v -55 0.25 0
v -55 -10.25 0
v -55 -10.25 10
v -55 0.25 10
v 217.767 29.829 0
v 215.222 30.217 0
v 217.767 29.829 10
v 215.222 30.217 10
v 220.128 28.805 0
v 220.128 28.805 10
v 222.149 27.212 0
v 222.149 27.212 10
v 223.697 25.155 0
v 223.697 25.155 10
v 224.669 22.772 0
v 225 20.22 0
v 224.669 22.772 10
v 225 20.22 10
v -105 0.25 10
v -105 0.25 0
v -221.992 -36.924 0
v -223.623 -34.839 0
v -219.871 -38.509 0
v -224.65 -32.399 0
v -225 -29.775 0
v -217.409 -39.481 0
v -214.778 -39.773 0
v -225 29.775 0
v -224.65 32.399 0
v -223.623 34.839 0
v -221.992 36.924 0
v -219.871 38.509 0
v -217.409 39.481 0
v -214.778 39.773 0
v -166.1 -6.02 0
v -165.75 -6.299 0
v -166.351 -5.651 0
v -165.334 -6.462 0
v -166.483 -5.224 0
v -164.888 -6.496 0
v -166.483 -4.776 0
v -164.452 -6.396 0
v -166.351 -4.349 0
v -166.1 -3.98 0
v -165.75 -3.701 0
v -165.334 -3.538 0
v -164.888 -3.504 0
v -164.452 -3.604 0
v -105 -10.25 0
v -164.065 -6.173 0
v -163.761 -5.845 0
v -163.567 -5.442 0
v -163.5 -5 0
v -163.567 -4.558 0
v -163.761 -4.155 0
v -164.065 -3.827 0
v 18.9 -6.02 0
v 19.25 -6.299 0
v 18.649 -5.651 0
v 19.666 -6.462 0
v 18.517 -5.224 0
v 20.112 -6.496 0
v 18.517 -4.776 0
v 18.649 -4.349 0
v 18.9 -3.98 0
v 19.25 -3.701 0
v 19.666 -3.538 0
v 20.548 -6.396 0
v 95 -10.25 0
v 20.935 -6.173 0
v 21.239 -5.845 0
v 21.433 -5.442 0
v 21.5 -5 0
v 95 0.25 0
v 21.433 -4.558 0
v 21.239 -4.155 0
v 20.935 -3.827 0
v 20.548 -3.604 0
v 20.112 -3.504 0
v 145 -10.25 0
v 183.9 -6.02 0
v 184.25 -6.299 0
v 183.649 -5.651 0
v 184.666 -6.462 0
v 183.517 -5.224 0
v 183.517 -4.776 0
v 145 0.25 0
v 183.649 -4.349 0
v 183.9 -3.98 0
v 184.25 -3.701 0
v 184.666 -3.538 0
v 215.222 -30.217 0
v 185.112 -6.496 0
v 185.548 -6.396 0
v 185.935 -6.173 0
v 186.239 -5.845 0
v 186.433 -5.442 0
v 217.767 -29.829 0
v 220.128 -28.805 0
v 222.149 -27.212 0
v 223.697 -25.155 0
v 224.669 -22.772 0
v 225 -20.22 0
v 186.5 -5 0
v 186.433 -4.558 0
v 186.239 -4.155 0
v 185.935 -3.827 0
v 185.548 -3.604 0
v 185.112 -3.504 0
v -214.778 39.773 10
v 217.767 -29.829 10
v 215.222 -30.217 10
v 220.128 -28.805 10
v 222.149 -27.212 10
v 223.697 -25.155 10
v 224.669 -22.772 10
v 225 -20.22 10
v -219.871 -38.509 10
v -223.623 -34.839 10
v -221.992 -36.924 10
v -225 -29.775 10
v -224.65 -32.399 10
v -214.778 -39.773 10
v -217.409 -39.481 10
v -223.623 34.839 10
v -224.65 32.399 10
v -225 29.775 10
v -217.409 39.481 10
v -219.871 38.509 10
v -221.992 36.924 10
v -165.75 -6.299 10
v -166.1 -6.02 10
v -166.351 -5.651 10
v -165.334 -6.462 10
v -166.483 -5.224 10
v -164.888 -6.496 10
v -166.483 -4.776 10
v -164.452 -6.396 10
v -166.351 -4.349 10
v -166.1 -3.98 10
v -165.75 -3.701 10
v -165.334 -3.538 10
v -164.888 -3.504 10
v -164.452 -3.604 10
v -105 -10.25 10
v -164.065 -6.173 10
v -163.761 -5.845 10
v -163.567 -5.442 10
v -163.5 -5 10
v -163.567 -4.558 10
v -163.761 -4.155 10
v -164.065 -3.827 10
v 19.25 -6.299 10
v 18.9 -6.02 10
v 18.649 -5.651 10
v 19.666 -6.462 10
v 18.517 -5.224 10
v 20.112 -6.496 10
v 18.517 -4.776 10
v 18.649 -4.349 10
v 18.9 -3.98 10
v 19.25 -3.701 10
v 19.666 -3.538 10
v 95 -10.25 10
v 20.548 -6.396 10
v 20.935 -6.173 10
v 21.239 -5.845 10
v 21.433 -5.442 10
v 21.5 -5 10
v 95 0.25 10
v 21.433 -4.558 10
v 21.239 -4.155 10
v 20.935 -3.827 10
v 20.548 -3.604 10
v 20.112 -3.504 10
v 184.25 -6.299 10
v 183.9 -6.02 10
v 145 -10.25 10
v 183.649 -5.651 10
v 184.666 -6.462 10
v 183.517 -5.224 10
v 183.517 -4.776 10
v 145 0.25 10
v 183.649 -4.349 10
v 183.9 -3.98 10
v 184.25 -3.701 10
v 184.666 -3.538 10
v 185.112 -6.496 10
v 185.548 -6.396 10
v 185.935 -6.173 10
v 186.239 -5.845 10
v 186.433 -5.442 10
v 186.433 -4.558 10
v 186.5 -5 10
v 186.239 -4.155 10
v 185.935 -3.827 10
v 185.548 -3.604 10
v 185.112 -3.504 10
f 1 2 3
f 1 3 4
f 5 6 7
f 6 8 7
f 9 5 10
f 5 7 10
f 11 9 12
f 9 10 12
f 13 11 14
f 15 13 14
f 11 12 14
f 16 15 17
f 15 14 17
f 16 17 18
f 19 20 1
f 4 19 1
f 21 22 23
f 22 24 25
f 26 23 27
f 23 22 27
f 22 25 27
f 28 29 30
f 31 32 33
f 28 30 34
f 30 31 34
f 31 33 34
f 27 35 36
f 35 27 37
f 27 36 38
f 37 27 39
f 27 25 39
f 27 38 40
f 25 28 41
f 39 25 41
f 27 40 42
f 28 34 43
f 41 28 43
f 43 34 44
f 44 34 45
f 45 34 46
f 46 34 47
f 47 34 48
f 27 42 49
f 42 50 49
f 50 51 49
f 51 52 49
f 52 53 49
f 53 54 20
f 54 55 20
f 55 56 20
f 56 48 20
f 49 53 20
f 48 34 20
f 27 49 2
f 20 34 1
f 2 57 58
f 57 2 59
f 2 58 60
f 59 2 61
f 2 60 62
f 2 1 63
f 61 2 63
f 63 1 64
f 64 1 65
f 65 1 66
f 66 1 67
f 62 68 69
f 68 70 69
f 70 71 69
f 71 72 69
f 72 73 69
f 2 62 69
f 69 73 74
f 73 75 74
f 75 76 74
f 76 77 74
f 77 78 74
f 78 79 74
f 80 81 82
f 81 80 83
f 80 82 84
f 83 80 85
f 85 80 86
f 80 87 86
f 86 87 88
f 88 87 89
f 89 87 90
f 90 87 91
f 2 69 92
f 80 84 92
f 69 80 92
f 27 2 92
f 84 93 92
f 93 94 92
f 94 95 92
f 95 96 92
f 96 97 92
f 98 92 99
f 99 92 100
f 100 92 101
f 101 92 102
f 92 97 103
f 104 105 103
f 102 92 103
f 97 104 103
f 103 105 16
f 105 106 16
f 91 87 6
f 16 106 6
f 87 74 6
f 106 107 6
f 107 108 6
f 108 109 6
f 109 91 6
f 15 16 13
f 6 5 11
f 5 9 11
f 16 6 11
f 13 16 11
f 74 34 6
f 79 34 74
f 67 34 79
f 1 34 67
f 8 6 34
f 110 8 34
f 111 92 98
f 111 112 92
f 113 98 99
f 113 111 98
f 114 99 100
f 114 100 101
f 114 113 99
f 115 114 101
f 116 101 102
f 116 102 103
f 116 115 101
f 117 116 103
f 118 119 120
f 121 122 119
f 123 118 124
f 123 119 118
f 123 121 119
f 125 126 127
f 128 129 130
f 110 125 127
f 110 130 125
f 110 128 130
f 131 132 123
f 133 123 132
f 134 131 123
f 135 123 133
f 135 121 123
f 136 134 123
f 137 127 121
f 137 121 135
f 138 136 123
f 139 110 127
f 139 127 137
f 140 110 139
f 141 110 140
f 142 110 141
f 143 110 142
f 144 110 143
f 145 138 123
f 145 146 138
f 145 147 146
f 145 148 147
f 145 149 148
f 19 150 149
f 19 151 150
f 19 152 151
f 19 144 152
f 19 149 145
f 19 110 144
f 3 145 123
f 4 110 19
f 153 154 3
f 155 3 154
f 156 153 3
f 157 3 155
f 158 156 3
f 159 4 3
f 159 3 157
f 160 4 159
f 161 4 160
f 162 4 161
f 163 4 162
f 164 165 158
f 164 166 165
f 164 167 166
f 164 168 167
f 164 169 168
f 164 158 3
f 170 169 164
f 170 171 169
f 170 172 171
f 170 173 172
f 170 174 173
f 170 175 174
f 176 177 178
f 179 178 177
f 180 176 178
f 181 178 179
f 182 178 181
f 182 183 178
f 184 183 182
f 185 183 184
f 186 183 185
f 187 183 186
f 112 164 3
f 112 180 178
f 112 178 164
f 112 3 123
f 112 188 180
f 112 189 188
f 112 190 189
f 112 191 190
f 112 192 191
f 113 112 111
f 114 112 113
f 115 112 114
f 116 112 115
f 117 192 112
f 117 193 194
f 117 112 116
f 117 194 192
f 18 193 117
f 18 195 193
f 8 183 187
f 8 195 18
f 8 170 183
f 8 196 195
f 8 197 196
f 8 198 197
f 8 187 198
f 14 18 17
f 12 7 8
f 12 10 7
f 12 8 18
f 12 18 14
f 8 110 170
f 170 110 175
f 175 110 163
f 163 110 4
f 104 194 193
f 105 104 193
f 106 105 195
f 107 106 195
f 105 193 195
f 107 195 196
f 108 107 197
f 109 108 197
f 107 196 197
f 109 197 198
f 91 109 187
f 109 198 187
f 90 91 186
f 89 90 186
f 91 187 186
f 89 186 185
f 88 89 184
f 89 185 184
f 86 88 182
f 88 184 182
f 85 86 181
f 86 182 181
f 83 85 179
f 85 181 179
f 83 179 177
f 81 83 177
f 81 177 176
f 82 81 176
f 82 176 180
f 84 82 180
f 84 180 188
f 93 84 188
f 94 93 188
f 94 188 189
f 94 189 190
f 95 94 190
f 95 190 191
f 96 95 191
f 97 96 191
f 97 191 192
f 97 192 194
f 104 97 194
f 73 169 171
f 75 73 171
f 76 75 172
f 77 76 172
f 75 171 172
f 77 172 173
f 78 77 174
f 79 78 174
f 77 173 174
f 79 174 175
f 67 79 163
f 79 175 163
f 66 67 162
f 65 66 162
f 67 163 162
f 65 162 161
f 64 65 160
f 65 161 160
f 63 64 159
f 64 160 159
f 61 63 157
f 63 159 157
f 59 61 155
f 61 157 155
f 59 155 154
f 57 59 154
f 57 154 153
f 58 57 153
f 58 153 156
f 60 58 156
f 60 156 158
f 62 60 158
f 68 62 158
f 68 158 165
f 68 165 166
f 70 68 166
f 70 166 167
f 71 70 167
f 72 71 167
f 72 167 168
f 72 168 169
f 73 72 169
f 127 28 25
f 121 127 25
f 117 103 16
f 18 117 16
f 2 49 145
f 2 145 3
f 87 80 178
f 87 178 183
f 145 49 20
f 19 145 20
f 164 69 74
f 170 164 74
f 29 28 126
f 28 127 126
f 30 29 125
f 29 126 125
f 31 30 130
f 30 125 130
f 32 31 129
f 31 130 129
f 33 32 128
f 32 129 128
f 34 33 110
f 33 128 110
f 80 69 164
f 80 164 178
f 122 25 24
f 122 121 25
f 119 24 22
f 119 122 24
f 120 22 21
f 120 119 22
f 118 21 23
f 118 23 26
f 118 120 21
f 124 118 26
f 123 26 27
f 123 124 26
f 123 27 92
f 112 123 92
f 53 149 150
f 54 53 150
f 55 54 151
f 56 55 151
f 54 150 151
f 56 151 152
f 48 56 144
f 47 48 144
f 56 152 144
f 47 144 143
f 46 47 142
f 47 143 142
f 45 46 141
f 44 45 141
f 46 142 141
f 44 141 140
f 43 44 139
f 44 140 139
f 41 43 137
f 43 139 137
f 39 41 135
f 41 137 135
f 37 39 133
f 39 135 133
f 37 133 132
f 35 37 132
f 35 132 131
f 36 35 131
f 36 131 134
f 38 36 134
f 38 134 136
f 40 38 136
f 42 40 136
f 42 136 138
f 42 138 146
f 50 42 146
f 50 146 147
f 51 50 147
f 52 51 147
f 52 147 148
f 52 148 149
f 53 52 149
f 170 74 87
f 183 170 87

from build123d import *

# Parameters (mm, degrees)
SKETCH1_W              = 50
SKETCH1_H              = 10.5
EXTRUDE_582_DEPTH      = 10
FILLET1_R              = 10
CUT_EXTRUDE_1185_REACH = 230.707
SKETCH2_R              = 1.5


with BuildPart() as part:
    # Sketch1 → Extrude 582 (new body)
    with BuildSketch(Plane.XY):
        Polygon((-225, 40), (-225, -40), (225, -30), (225, 30), align=None)
        with Locations((-80, -5)):
            Rectangle(SKETCH1_W, SKETCH1_H, mode=Mode.SUBTRACT)
        with Locations((120, -5)):
            Rectangle(SKETCH1_W, SKETCH1_H, mode=Mode.SUBTRACT)
    extrude(amount=EXTRUDE_582_DEPTH)

    # Fillet1
    fillet1_edges = [part.edges().sort_by_distance(p)[0] for p in [
        (225, 30, 5),
        (225, -30, 5),
        (-225, -40, 5),
        (-225, 40, 5),
    ]]
    fillet(fillet1_edges, radius=FILLET1_R)

    # Sketch2 → Cut-Extrude 1185 (cut, up to next)
    with BuildSketch(Plane.XY.offset(10), mode=Mode.PRIVATE) as cut_extrude_1185_sk1:
        with Locations((-165, -5)):
            Circle(SKETCH2_R)
    cut_extrude_1185_tool1 = extrude(cut_extrude_1185_sk1.sketch, amount=-CUT_EXTRUDE_1185_REACH, mode=Mode.PRIVATE) & part.part
    # Sketch2 → Cut-Extrude 1185 (cut, up to next)
    with BuildSketch(Plane.XY.offset(10), mode=Mode.PRIVATE) as cut_extrude_1185_sk2:
        with Locations((20, -5)):
            Circle(SKETCH2_R)
    cut_extrude_1185_tool2 = extrude(cut_extrude_1185_sk2.sketch, amount=-CUT_EXTRUDE_1185_REACH, mode=Mode.PRIVATE) & part.part
    # Sketch2 → Cut-Extrude 1185 (cut, up to next)
    with BuildSketch(Plane.XY.offset(10), mode=Mode.PRIVATE) as cut_extrude_1185_sk3:
        with Locations((185, -5)):
            Circle(SKETCH2_R)
    cut_extrude_1185_tool3 = extrude(cut_extrude_1185_sk3.sketch, amount=-CUT_EXTRUDE_1185_REACH, mode=Mode.PRIVATE) & part.part
    add(cut_extrude_1185_tool1.solids().sort_by_distance((-165, -5, 10))[0], mode=Mode.SUBTRACT)
    add(cut_extrude_1185_tool2.solids().sort_by_distance((20, -5, 10))[0], mode=Mode.SUBTRACT)
    add(cut_extrude_1185_tool3.solids().sort_by_distance((185, -5, 10))[0], mode=Mode.SUBTRACT)


solid = part.part
